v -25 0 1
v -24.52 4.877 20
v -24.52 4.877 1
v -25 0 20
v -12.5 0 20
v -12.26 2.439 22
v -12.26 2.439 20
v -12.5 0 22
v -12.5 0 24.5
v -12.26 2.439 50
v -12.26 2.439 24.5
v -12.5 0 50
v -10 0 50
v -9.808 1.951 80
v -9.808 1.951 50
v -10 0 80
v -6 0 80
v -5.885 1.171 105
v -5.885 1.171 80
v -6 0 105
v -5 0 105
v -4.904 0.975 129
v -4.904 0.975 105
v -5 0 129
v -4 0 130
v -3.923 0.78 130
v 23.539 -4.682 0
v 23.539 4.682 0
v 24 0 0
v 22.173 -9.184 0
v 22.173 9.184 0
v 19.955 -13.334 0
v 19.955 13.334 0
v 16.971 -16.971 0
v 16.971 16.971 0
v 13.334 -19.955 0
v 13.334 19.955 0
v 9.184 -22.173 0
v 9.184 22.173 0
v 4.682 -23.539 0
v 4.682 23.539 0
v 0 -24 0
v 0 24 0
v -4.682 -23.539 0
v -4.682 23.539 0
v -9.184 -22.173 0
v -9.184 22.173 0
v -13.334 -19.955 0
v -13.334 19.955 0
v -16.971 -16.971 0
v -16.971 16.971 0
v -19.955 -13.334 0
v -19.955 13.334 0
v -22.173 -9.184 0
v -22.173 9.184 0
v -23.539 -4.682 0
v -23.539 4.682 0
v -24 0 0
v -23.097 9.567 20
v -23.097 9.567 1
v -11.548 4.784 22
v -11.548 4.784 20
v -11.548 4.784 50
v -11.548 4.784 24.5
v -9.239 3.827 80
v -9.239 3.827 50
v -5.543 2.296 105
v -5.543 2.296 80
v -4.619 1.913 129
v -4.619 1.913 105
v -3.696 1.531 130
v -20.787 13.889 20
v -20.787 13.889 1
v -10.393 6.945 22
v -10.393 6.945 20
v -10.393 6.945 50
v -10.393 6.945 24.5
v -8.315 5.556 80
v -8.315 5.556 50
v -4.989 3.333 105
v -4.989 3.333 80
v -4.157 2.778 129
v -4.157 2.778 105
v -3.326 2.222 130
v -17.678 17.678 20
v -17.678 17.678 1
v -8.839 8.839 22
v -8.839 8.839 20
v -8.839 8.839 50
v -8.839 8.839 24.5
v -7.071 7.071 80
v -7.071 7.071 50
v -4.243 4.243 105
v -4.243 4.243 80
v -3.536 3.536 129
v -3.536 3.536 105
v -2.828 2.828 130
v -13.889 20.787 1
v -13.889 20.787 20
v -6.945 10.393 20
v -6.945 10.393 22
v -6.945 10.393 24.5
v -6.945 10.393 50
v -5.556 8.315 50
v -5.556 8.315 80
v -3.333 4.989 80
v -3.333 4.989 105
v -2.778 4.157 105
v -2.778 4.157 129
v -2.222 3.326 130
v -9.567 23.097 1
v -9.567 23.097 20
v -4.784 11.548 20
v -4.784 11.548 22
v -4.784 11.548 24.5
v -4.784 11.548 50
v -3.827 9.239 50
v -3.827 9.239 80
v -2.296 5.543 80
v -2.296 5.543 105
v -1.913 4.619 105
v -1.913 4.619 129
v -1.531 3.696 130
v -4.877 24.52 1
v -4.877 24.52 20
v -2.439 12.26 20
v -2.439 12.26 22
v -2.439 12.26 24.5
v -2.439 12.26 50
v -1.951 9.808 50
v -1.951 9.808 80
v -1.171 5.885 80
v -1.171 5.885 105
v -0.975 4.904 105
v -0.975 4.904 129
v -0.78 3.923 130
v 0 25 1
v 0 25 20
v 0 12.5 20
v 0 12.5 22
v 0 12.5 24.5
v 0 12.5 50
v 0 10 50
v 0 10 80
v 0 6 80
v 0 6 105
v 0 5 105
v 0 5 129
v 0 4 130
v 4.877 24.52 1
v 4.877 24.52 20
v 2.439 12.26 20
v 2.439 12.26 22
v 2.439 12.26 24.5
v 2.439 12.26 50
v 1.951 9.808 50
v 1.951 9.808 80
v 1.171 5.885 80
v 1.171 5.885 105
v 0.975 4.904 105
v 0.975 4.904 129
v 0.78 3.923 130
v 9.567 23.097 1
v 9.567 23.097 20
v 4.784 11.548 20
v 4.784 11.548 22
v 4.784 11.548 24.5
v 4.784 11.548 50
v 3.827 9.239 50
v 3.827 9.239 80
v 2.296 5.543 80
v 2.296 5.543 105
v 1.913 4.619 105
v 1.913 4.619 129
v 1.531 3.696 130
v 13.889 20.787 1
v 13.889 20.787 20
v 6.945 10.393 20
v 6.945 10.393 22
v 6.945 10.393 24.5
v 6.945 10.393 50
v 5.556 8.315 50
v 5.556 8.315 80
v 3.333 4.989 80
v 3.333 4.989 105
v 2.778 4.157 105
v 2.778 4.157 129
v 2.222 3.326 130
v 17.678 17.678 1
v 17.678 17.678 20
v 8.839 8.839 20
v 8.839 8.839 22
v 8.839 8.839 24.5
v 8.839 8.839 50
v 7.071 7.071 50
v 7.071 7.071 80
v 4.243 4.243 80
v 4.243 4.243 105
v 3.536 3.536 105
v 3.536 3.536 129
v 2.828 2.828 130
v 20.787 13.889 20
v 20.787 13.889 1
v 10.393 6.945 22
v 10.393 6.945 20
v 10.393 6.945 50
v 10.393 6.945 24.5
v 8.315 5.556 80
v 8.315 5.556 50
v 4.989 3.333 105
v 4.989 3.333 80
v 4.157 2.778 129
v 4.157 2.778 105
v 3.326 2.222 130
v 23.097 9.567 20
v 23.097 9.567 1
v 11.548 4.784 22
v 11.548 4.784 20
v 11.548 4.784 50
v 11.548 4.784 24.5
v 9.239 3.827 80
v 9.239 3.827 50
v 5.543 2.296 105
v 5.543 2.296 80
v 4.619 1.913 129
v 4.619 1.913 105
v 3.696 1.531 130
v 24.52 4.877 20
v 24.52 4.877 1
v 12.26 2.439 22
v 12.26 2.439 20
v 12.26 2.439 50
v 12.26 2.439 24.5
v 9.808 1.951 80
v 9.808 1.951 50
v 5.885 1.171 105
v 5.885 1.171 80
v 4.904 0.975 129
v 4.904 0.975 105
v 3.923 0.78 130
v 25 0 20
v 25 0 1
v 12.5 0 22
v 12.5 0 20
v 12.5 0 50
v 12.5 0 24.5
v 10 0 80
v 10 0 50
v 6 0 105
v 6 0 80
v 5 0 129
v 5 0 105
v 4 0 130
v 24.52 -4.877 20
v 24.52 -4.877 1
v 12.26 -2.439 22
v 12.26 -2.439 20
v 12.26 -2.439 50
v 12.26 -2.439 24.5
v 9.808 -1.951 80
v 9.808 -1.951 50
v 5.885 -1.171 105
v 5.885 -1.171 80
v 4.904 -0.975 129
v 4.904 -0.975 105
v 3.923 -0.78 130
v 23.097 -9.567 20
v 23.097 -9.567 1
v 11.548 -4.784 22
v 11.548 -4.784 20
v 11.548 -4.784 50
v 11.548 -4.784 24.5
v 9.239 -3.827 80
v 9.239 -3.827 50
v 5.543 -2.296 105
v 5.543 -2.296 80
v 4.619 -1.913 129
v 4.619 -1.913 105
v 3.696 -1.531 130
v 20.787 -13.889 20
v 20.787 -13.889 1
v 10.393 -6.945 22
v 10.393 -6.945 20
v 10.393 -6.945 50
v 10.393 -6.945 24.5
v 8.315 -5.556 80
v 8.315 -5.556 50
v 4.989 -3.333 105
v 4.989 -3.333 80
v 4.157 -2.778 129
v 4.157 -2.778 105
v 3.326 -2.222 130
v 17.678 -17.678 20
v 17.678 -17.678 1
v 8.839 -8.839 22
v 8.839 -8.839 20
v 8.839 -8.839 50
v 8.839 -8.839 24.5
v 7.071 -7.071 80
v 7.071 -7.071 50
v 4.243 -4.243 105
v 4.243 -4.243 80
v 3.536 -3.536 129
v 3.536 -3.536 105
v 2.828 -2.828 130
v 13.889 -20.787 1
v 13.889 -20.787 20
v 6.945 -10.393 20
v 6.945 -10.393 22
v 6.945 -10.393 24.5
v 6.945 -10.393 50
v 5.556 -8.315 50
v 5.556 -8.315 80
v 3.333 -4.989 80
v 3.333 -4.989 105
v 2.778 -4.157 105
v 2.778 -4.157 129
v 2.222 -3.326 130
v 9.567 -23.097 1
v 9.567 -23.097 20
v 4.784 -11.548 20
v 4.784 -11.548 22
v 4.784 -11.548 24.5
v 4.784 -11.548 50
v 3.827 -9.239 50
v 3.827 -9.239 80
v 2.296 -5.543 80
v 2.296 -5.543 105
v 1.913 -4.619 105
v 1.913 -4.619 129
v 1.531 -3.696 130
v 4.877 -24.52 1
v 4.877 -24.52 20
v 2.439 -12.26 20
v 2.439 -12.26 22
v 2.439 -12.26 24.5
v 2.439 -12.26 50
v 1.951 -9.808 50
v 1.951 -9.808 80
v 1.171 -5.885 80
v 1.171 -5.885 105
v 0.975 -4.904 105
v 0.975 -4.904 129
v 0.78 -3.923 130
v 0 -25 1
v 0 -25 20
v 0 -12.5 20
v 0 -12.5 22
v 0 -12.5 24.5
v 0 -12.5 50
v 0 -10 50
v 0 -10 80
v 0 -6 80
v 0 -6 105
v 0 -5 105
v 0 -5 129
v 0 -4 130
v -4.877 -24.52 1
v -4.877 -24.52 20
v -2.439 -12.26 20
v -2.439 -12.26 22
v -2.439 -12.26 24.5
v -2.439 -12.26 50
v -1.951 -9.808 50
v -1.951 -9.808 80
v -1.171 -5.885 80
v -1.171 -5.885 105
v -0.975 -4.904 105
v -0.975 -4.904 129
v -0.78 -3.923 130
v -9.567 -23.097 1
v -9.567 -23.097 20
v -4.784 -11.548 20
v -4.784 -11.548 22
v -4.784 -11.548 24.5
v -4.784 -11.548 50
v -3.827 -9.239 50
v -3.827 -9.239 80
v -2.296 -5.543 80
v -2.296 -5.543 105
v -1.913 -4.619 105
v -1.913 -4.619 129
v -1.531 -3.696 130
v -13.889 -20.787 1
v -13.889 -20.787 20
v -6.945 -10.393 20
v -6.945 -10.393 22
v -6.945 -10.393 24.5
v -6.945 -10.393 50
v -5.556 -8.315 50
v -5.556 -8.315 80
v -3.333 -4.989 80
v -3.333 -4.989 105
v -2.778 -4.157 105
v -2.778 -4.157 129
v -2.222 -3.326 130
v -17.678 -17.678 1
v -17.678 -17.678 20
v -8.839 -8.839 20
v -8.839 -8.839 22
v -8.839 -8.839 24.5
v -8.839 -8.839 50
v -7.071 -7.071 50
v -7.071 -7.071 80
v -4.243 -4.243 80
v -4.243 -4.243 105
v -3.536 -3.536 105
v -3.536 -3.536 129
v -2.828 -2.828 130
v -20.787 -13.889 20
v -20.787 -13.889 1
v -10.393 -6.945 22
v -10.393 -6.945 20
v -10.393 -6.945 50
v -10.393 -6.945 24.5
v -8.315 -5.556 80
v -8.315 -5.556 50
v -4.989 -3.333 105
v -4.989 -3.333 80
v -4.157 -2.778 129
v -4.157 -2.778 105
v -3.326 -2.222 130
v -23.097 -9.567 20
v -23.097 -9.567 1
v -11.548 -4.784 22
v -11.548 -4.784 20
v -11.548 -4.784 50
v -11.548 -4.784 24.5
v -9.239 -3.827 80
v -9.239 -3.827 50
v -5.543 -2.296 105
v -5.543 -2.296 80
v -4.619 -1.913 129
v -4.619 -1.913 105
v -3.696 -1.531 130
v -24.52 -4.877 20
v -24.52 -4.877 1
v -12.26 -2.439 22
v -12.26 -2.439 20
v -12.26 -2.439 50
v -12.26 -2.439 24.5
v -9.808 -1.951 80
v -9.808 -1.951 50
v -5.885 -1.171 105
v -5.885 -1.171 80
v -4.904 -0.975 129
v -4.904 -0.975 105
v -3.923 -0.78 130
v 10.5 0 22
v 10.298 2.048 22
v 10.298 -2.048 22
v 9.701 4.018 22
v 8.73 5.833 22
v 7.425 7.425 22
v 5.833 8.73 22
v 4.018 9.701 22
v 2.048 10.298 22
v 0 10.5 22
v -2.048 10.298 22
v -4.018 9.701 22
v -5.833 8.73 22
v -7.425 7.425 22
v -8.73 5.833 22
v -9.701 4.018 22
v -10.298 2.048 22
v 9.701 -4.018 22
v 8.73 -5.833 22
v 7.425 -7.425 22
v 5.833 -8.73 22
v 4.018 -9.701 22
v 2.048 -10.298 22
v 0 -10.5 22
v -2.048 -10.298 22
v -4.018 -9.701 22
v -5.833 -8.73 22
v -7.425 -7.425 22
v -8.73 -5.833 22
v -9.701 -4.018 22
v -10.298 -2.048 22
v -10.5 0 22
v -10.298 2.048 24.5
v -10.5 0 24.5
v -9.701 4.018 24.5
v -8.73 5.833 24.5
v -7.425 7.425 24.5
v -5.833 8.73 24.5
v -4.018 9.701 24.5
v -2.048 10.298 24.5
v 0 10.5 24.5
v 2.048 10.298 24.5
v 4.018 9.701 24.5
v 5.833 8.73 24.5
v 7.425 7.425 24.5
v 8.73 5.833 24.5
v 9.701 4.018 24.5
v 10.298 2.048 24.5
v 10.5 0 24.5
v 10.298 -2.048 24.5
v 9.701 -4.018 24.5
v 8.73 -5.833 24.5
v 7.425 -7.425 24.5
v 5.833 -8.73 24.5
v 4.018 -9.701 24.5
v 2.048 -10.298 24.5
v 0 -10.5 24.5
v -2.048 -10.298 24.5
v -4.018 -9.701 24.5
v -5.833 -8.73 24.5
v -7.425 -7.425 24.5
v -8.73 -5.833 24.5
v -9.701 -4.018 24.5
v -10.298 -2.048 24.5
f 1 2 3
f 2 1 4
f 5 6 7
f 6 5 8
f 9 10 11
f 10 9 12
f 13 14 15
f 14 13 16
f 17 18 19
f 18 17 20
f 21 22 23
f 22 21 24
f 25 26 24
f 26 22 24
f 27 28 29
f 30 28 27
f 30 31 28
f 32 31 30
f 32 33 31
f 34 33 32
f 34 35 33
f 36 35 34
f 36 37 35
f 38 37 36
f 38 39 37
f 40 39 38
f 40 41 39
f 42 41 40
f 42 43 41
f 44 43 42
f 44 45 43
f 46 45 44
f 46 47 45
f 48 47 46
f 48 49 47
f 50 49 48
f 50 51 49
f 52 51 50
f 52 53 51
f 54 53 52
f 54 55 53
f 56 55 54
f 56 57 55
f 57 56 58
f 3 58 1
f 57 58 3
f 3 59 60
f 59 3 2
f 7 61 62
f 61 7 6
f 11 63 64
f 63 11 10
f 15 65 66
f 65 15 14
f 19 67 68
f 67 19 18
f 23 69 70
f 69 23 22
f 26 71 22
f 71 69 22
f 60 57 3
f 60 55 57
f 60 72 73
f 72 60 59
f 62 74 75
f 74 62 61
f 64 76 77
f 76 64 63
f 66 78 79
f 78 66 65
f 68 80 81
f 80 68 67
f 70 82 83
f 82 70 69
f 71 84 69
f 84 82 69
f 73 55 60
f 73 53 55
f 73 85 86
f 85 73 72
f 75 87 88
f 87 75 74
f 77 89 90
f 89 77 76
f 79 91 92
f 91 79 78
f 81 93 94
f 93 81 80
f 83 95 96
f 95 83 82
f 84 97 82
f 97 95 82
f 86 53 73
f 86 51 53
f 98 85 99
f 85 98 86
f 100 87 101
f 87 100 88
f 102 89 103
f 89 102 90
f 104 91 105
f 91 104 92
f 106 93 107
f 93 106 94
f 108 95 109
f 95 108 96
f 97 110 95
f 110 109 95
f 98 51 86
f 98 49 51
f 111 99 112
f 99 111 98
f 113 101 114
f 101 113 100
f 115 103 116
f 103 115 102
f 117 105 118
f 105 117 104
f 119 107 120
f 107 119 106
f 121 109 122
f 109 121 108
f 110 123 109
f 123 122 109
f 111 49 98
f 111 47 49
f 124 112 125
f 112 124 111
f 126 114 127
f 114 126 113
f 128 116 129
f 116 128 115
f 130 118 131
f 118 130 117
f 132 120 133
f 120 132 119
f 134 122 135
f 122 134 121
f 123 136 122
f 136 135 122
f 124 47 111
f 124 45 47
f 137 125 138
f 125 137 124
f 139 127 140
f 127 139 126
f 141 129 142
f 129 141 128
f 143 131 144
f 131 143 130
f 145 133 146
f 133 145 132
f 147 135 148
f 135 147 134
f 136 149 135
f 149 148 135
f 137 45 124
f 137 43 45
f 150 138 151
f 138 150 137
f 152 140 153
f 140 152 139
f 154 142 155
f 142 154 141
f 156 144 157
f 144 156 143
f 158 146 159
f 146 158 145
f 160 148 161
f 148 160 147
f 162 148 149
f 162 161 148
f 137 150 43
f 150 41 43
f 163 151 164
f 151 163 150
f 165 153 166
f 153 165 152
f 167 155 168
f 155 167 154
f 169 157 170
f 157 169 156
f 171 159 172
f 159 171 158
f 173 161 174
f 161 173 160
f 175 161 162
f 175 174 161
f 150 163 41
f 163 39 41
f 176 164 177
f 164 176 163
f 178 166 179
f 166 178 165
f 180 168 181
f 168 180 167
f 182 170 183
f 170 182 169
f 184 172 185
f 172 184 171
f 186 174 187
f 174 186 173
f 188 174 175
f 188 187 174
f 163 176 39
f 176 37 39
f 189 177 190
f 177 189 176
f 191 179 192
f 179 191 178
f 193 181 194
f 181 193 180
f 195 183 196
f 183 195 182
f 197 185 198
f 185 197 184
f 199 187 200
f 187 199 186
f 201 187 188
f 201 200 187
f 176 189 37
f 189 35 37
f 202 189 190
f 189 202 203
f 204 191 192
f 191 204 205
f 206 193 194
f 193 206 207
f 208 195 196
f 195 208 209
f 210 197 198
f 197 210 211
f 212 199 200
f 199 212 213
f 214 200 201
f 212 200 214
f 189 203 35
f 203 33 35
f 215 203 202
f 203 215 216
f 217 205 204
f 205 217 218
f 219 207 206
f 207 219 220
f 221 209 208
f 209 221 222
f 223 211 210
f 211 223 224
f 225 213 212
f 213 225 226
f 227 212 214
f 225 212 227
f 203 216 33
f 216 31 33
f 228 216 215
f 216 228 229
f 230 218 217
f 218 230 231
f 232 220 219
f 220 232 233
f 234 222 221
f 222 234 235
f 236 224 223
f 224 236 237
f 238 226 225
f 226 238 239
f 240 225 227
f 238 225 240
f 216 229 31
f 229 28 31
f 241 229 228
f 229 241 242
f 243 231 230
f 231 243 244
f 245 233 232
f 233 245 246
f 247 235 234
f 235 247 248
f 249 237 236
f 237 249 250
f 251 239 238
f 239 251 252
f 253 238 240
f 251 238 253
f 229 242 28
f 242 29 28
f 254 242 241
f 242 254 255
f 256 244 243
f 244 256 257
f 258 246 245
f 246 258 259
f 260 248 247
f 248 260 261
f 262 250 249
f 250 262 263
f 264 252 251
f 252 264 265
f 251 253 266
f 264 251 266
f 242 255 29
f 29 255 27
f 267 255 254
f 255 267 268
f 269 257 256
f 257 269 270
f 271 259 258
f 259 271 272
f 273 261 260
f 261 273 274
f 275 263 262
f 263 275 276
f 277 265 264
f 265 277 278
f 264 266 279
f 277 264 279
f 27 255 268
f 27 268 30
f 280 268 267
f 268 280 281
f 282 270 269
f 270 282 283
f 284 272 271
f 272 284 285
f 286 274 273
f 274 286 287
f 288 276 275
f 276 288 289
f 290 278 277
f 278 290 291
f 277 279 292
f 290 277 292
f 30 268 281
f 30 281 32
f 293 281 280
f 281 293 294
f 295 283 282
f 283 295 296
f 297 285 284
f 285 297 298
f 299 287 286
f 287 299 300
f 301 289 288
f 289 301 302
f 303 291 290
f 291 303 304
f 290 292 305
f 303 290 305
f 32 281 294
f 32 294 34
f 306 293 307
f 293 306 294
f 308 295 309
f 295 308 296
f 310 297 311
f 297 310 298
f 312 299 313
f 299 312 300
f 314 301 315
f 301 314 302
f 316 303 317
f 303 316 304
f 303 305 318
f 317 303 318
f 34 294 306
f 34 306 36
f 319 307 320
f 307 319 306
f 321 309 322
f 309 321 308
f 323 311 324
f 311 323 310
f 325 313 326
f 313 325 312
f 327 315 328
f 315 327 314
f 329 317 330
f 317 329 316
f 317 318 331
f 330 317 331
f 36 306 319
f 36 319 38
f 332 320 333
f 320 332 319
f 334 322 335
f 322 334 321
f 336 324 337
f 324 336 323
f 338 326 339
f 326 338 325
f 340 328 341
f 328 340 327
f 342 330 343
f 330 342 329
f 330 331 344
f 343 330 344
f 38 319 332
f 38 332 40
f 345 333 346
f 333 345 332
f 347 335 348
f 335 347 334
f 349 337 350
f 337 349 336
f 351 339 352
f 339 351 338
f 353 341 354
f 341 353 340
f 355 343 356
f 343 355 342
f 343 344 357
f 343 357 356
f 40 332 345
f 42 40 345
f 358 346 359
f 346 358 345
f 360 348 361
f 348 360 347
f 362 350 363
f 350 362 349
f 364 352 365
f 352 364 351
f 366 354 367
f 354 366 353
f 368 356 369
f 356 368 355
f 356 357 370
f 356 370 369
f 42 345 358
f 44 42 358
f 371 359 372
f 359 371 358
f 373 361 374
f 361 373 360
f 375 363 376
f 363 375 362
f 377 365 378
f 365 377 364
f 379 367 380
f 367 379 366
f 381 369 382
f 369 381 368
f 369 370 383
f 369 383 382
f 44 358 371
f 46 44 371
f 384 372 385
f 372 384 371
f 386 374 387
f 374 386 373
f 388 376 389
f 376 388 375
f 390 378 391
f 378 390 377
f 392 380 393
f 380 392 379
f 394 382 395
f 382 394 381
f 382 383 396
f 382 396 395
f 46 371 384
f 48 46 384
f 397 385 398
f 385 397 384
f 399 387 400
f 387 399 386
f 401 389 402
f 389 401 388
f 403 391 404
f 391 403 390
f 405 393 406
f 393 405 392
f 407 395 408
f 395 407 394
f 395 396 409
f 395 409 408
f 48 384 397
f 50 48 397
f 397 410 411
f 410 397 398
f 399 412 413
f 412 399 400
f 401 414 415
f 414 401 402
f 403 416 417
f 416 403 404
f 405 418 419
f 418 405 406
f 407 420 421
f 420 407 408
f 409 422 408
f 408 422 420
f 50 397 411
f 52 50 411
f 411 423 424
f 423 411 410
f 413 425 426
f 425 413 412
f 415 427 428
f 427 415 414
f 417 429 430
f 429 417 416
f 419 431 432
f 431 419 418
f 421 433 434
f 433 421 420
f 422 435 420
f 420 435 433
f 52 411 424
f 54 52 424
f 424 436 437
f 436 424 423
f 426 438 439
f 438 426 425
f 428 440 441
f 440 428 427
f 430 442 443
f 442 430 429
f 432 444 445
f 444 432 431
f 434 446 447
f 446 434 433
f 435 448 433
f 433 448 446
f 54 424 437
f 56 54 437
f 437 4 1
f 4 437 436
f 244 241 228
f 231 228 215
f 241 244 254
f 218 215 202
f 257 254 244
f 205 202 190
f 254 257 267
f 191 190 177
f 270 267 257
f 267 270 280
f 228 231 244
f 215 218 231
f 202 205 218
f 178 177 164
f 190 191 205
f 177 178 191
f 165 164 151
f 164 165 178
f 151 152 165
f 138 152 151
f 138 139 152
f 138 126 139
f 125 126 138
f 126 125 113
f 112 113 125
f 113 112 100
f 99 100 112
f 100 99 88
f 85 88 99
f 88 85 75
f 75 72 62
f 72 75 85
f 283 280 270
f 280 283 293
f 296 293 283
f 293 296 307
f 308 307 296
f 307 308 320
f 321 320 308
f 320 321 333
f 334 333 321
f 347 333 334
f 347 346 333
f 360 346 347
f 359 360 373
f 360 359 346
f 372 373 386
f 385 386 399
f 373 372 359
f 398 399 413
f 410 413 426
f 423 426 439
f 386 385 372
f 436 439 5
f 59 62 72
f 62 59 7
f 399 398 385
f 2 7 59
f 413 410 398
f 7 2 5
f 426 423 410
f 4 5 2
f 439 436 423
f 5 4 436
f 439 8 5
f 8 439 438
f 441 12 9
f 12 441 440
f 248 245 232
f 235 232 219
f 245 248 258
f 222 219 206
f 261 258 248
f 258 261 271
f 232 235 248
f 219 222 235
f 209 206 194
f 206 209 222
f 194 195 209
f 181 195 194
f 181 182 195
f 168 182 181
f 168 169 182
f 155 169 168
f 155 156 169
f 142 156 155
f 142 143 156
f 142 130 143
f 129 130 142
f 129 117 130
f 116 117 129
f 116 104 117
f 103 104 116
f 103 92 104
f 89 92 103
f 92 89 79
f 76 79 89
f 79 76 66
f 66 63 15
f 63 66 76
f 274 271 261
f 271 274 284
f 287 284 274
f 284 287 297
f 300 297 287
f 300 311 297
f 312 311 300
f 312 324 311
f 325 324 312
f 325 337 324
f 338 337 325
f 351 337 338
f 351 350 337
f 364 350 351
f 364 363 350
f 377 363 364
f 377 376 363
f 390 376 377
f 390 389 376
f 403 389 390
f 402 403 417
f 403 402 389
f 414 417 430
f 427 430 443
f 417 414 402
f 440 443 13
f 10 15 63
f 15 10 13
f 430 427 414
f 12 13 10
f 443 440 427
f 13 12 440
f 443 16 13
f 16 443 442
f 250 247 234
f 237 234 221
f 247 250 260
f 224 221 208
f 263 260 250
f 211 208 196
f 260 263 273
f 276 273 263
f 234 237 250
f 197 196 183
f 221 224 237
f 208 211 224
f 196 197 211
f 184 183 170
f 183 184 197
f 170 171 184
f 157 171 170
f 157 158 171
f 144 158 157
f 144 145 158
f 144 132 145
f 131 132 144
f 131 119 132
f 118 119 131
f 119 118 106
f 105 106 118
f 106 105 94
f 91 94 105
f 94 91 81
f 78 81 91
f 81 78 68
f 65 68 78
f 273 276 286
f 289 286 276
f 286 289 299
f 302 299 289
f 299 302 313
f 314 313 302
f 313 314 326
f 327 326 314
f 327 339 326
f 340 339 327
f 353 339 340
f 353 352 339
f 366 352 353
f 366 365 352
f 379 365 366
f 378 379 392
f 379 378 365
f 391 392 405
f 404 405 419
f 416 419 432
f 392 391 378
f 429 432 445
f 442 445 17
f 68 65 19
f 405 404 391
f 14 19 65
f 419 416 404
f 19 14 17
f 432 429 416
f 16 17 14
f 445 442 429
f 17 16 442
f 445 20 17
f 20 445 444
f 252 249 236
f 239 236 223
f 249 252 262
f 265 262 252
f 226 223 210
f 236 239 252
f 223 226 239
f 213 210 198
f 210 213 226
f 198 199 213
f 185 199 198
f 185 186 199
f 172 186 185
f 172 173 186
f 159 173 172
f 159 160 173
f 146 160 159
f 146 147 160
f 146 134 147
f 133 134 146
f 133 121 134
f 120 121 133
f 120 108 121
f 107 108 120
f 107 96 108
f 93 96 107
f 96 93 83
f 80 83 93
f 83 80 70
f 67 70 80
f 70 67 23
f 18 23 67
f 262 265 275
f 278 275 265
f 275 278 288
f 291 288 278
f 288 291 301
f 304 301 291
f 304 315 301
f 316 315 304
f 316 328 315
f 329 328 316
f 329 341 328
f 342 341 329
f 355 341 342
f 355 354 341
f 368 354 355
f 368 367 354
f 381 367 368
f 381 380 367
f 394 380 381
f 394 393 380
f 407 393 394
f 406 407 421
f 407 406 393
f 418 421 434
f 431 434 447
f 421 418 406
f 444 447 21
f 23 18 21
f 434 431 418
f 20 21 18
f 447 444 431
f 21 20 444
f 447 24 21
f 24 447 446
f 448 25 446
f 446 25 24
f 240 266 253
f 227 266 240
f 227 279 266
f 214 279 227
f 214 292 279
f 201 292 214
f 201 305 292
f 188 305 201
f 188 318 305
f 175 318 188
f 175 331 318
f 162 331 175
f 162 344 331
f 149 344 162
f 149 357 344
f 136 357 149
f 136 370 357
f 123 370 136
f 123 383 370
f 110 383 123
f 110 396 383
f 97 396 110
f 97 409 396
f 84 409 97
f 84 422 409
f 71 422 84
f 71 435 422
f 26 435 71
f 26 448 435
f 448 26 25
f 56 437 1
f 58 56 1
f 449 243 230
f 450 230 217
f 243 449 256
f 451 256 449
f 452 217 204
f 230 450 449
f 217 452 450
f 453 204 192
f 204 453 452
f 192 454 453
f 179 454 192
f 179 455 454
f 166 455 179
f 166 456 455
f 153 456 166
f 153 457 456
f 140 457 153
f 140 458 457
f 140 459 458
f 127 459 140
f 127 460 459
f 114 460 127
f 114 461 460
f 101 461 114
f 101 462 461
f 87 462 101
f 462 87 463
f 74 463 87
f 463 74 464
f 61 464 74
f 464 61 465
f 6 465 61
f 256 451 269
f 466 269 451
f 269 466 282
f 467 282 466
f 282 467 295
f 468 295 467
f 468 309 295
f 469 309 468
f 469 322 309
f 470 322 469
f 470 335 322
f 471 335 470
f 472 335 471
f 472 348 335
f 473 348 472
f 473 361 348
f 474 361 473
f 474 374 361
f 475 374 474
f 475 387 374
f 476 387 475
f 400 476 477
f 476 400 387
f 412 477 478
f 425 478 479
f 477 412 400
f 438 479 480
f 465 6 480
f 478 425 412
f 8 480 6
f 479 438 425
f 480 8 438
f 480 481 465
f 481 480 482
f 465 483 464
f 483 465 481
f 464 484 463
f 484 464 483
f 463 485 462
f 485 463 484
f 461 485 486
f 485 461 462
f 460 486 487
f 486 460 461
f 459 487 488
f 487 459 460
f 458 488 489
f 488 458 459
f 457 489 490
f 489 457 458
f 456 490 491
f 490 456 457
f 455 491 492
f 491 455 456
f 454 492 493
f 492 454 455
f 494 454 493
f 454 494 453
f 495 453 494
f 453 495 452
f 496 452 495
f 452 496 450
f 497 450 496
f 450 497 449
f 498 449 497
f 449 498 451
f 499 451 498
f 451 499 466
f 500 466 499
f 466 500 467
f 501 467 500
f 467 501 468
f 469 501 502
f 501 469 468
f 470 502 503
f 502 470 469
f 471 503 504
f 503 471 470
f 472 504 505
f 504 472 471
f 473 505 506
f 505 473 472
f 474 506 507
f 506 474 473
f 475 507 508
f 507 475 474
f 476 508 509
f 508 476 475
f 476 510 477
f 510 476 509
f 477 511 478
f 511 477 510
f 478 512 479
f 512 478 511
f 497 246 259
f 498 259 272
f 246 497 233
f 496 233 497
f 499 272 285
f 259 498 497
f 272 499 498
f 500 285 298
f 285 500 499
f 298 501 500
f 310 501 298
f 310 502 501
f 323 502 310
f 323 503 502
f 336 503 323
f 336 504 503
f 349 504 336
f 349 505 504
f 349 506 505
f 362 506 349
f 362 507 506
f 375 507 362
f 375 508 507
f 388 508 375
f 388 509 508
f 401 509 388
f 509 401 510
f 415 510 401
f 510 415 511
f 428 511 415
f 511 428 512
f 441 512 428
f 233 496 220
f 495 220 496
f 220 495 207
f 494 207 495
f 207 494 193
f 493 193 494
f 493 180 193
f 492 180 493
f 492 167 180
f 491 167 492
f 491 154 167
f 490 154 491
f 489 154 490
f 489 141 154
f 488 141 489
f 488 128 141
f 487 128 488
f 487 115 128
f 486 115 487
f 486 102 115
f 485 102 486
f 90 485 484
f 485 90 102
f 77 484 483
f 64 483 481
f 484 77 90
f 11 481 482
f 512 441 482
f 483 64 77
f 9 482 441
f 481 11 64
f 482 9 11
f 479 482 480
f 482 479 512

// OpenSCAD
$fn = 32;

// ----------------------------------------------------------------------
// Stepped shaft: diameters 50, 25, 20, 12, 10 mm, 130 mm long
// ----------------------------------------------------------------------

// --- parameters (mm) ---
d1 = 50;                  // step 1 diameter
len1 = 20;                // step 1 length
d2 = 25;                  // step 2 diameter
len2 = 30;                // step 2 length
d3 = 20;                  // step 3 diameter
len3 = 30;                // step 3 length
d4 = 12;                  // step 4 diameter
len4 = 25;                // step 4 length
d5 = 10;                  // step 5 diameter
len5 = 25;                // step 5 length
total = 130;              // overall length
chamfer = 1;              // end chamfer
groove_r = 12.5;          // groove radius
groove_z = 22;            // groove position from the end
groove_w = 2.5;           // groove width
groove_d = 2;             // groove depth

/* closed turning profile: x is the radius, y is the length */
profile = [[0, 0], [25 - chamfer, 0], [25, chamfer], [25, 20], [12.5, 20], [12.5, 50], [10, 50], [10, 80], [6, 80], [6, 105], [5, 105], [5, 129], [4, 130], [0, 130]];

difference() {
  rotate_extrude() polygon(profile);
  /* circlip groove just behind the shoulder */
  rotate_extrude() translate([groove_r - groove_d, groove_z]) square([groove_d + 1, groove_w]);
}
